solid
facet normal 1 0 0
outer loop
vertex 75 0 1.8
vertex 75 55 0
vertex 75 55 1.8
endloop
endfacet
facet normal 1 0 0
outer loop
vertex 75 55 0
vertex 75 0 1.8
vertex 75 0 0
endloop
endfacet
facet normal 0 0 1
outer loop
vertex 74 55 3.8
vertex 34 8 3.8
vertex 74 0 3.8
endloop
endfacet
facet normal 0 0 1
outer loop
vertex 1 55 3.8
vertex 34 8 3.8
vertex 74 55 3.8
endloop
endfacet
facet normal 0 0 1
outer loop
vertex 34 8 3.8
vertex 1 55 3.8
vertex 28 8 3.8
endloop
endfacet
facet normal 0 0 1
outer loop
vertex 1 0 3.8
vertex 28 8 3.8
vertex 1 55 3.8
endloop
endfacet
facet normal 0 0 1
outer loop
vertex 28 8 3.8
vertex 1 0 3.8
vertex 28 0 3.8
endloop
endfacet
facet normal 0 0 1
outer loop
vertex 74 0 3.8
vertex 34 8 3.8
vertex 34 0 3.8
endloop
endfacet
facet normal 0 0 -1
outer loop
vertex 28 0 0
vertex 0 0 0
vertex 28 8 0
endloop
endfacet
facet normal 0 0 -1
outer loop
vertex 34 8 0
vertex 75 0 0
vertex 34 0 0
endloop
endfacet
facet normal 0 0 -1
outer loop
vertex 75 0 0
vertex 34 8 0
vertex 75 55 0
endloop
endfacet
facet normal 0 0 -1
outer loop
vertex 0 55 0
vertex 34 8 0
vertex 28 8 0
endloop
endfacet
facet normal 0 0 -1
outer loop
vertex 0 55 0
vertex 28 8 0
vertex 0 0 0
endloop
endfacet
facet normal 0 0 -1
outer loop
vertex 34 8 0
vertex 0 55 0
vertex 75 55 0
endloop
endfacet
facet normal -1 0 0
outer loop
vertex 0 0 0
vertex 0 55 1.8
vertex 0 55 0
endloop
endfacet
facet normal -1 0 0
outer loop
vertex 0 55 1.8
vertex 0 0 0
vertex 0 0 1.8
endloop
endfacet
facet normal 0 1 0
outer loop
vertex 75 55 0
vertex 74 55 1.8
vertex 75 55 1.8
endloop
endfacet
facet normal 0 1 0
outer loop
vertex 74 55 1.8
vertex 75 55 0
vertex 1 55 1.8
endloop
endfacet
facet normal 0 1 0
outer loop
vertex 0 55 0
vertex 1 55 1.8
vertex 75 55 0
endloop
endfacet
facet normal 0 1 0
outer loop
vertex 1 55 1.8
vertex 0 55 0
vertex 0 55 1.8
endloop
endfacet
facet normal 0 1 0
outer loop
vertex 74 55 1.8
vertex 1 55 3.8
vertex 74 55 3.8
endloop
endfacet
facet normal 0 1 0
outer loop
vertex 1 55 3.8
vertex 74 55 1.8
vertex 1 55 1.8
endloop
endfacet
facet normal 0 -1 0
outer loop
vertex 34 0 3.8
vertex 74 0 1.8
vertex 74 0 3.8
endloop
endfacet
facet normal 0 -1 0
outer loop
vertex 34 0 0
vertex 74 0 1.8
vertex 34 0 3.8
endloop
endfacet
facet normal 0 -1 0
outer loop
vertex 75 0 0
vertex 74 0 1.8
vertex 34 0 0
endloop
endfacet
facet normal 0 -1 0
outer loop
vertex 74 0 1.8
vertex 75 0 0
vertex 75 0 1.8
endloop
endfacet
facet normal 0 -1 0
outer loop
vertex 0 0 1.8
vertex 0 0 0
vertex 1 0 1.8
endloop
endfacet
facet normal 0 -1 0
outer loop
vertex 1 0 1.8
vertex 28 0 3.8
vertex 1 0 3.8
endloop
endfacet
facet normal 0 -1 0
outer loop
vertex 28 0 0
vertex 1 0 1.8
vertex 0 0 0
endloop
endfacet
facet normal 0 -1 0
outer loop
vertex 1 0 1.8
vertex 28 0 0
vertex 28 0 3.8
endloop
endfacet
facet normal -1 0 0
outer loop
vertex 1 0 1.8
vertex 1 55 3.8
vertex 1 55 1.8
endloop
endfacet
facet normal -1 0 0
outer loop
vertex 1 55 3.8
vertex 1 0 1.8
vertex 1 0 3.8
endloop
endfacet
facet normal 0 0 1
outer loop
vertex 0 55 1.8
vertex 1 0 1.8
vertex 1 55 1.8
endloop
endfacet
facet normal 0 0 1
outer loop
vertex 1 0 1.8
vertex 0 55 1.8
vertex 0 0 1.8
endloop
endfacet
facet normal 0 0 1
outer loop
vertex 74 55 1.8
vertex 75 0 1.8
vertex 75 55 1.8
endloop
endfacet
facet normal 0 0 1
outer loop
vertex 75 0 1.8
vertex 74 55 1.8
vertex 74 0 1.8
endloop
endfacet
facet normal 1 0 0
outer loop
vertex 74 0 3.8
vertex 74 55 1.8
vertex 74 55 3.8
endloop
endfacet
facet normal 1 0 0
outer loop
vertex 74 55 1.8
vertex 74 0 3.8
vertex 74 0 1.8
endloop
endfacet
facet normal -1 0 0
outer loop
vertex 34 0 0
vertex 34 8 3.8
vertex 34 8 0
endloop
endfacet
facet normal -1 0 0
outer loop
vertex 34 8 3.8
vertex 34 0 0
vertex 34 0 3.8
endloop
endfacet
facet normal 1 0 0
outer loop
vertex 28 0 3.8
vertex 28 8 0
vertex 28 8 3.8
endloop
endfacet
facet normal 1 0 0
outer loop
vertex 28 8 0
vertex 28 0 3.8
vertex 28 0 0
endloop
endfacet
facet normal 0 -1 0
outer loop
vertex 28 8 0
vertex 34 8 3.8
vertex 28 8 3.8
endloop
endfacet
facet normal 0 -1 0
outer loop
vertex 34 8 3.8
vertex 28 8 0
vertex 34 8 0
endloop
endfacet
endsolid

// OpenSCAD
// ****************************************************************************
// Cover for the controller enclosure
// resize and add holes for LEDs as required...
// Author: Peter Holzwarth
// ****************************************************************************

// width of the controller box in mm
boxWidth= 74+4; // [20:100]

// height of the controller box in mm
boxHeight= 53+4; // [20:100]

// distance of the LED window from the front left corner, or 0 for no window
LedWindow= 28; // [0:100]

// controller cap
controllerCap([boxWidth, boxHeight], LedWindow);

module controllerCap(dimensions, LedWindow) {
    difference() {
        // outer box
        cube([dimensions[0]-3, dimensions[1]-2, 3.8]);
        // slide-in left
        translate([-0.1, -0.1, 1.8]) 
            cube([1.1, dimensions[1]-2+0.2, 2.1]);
        // slide-in right
        translate([dimensions[0]-3-1, -0.1, 1.8]) 
            cube([1.1, dimensions[1]-2+0.2, 2.1]);
        if (LedWindow) {
            // opening for LED lights
            translate([LedWindow, -0.1, -0.1]) cube([6, 8.1, 4.2]);
        }
    }
}
